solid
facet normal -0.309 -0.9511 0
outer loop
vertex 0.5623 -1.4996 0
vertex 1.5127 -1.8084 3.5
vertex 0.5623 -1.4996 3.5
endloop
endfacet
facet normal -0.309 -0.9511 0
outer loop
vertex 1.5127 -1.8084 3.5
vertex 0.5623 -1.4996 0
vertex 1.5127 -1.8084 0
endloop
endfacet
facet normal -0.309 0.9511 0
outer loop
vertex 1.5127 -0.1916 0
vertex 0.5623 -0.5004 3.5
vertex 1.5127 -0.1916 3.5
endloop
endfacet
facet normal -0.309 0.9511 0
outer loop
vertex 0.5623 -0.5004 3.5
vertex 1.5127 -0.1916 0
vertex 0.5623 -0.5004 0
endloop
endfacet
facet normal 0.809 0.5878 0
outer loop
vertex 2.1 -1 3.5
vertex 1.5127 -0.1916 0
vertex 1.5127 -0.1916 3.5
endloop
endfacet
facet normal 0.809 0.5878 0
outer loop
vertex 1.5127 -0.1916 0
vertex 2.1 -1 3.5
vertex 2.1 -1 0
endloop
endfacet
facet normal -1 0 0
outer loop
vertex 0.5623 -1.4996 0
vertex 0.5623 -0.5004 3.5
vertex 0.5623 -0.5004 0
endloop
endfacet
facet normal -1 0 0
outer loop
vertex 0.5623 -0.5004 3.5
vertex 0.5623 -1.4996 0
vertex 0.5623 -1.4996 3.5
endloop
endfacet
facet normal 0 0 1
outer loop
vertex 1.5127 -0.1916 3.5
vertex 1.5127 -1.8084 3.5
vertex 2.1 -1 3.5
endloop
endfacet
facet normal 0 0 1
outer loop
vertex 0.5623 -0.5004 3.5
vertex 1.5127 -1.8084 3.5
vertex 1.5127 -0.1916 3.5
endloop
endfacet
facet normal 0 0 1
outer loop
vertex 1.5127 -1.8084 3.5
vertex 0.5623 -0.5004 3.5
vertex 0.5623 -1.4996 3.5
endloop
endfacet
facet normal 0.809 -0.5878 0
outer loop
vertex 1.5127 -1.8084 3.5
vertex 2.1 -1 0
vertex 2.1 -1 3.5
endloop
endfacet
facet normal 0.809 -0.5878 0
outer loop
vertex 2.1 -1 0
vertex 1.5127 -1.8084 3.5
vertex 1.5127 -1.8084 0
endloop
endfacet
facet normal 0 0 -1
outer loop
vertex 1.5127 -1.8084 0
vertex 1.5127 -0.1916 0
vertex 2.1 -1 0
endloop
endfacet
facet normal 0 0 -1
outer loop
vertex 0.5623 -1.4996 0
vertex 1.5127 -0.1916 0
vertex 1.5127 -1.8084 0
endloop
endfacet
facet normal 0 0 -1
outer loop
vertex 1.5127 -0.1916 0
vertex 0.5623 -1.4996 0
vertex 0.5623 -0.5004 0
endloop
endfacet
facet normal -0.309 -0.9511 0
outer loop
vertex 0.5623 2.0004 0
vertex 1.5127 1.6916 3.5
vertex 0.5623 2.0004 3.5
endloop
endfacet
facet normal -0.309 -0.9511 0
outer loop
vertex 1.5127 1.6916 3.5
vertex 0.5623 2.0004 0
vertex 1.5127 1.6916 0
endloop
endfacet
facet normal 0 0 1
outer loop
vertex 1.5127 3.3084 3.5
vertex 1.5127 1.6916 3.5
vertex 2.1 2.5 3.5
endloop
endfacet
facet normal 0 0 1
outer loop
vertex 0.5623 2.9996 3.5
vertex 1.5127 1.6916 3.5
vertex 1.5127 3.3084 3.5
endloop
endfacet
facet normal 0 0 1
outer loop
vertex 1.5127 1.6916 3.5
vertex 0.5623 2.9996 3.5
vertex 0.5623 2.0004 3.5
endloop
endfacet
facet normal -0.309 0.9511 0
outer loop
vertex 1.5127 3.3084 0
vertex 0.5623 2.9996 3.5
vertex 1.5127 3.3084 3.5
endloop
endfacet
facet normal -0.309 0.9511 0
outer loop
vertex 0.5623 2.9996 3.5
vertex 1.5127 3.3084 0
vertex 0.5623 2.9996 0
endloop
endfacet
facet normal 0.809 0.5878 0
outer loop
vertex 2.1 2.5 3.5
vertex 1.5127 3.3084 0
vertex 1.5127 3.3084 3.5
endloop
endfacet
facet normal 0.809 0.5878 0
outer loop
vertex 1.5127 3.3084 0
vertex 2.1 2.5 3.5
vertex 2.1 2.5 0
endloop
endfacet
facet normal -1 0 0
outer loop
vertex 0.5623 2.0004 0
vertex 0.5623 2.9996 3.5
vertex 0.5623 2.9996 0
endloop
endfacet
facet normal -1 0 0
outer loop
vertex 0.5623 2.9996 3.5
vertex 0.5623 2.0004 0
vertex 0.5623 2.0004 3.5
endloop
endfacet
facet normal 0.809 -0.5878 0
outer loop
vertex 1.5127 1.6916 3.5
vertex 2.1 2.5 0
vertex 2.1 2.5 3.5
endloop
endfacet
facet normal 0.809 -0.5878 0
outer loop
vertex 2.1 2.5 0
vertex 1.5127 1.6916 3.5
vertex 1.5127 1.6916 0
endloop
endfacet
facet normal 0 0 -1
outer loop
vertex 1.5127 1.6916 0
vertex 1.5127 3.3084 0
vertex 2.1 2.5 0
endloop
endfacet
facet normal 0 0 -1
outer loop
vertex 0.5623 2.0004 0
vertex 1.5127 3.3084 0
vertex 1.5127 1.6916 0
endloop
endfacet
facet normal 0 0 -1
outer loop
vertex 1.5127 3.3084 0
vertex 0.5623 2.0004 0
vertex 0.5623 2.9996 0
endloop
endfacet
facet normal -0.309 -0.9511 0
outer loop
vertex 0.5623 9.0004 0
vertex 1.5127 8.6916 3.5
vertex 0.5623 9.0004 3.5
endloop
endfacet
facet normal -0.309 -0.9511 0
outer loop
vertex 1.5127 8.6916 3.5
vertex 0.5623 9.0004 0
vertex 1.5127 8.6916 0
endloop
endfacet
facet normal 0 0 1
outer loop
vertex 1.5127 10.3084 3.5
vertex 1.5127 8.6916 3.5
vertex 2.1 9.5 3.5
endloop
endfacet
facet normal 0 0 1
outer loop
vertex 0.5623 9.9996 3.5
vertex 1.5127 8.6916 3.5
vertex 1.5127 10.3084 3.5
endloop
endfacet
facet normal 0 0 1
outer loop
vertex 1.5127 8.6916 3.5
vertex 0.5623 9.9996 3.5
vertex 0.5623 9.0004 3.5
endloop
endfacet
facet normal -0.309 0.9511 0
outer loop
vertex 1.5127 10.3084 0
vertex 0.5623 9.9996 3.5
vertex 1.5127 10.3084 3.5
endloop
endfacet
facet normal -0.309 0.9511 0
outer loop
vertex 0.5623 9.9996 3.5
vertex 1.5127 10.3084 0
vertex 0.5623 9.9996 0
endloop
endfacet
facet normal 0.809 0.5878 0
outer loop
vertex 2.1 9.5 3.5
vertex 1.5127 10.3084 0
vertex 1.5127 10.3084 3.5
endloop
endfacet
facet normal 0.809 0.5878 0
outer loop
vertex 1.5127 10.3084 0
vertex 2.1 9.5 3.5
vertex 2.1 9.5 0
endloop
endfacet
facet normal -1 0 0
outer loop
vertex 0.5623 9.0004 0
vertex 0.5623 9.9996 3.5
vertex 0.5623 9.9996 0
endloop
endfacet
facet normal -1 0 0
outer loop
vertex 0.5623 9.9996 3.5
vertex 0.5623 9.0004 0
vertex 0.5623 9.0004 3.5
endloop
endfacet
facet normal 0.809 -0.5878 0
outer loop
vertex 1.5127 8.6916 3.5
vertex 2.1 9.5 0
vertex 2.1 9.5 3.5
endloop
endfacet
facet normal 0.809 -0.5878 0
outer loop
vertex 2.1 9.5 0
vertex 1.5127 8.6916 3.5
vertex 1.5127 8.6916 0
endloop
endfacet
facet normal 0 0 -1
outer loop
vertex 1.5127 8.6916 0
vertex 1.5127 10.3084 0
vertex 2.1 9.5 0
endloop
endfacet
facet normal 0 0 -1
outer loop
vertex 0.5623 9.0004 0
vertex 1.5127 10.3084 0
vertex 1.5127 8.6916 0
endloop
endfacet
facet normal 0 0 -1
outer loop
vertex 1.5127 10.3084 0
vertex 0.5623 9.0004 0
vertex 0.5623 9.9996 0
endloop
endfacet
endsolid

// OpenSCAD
union() {
  translate([1.25, -1.0, 0.0]) cylinder(r=0.85, h=3.5);
  translate([1.25, 2.5, 0.0]) cylinder(r=0.85, h=3.5);
  translate([1.25, 9.5, 0.0]) cylinder(r=0.85, h=3.5);
}
